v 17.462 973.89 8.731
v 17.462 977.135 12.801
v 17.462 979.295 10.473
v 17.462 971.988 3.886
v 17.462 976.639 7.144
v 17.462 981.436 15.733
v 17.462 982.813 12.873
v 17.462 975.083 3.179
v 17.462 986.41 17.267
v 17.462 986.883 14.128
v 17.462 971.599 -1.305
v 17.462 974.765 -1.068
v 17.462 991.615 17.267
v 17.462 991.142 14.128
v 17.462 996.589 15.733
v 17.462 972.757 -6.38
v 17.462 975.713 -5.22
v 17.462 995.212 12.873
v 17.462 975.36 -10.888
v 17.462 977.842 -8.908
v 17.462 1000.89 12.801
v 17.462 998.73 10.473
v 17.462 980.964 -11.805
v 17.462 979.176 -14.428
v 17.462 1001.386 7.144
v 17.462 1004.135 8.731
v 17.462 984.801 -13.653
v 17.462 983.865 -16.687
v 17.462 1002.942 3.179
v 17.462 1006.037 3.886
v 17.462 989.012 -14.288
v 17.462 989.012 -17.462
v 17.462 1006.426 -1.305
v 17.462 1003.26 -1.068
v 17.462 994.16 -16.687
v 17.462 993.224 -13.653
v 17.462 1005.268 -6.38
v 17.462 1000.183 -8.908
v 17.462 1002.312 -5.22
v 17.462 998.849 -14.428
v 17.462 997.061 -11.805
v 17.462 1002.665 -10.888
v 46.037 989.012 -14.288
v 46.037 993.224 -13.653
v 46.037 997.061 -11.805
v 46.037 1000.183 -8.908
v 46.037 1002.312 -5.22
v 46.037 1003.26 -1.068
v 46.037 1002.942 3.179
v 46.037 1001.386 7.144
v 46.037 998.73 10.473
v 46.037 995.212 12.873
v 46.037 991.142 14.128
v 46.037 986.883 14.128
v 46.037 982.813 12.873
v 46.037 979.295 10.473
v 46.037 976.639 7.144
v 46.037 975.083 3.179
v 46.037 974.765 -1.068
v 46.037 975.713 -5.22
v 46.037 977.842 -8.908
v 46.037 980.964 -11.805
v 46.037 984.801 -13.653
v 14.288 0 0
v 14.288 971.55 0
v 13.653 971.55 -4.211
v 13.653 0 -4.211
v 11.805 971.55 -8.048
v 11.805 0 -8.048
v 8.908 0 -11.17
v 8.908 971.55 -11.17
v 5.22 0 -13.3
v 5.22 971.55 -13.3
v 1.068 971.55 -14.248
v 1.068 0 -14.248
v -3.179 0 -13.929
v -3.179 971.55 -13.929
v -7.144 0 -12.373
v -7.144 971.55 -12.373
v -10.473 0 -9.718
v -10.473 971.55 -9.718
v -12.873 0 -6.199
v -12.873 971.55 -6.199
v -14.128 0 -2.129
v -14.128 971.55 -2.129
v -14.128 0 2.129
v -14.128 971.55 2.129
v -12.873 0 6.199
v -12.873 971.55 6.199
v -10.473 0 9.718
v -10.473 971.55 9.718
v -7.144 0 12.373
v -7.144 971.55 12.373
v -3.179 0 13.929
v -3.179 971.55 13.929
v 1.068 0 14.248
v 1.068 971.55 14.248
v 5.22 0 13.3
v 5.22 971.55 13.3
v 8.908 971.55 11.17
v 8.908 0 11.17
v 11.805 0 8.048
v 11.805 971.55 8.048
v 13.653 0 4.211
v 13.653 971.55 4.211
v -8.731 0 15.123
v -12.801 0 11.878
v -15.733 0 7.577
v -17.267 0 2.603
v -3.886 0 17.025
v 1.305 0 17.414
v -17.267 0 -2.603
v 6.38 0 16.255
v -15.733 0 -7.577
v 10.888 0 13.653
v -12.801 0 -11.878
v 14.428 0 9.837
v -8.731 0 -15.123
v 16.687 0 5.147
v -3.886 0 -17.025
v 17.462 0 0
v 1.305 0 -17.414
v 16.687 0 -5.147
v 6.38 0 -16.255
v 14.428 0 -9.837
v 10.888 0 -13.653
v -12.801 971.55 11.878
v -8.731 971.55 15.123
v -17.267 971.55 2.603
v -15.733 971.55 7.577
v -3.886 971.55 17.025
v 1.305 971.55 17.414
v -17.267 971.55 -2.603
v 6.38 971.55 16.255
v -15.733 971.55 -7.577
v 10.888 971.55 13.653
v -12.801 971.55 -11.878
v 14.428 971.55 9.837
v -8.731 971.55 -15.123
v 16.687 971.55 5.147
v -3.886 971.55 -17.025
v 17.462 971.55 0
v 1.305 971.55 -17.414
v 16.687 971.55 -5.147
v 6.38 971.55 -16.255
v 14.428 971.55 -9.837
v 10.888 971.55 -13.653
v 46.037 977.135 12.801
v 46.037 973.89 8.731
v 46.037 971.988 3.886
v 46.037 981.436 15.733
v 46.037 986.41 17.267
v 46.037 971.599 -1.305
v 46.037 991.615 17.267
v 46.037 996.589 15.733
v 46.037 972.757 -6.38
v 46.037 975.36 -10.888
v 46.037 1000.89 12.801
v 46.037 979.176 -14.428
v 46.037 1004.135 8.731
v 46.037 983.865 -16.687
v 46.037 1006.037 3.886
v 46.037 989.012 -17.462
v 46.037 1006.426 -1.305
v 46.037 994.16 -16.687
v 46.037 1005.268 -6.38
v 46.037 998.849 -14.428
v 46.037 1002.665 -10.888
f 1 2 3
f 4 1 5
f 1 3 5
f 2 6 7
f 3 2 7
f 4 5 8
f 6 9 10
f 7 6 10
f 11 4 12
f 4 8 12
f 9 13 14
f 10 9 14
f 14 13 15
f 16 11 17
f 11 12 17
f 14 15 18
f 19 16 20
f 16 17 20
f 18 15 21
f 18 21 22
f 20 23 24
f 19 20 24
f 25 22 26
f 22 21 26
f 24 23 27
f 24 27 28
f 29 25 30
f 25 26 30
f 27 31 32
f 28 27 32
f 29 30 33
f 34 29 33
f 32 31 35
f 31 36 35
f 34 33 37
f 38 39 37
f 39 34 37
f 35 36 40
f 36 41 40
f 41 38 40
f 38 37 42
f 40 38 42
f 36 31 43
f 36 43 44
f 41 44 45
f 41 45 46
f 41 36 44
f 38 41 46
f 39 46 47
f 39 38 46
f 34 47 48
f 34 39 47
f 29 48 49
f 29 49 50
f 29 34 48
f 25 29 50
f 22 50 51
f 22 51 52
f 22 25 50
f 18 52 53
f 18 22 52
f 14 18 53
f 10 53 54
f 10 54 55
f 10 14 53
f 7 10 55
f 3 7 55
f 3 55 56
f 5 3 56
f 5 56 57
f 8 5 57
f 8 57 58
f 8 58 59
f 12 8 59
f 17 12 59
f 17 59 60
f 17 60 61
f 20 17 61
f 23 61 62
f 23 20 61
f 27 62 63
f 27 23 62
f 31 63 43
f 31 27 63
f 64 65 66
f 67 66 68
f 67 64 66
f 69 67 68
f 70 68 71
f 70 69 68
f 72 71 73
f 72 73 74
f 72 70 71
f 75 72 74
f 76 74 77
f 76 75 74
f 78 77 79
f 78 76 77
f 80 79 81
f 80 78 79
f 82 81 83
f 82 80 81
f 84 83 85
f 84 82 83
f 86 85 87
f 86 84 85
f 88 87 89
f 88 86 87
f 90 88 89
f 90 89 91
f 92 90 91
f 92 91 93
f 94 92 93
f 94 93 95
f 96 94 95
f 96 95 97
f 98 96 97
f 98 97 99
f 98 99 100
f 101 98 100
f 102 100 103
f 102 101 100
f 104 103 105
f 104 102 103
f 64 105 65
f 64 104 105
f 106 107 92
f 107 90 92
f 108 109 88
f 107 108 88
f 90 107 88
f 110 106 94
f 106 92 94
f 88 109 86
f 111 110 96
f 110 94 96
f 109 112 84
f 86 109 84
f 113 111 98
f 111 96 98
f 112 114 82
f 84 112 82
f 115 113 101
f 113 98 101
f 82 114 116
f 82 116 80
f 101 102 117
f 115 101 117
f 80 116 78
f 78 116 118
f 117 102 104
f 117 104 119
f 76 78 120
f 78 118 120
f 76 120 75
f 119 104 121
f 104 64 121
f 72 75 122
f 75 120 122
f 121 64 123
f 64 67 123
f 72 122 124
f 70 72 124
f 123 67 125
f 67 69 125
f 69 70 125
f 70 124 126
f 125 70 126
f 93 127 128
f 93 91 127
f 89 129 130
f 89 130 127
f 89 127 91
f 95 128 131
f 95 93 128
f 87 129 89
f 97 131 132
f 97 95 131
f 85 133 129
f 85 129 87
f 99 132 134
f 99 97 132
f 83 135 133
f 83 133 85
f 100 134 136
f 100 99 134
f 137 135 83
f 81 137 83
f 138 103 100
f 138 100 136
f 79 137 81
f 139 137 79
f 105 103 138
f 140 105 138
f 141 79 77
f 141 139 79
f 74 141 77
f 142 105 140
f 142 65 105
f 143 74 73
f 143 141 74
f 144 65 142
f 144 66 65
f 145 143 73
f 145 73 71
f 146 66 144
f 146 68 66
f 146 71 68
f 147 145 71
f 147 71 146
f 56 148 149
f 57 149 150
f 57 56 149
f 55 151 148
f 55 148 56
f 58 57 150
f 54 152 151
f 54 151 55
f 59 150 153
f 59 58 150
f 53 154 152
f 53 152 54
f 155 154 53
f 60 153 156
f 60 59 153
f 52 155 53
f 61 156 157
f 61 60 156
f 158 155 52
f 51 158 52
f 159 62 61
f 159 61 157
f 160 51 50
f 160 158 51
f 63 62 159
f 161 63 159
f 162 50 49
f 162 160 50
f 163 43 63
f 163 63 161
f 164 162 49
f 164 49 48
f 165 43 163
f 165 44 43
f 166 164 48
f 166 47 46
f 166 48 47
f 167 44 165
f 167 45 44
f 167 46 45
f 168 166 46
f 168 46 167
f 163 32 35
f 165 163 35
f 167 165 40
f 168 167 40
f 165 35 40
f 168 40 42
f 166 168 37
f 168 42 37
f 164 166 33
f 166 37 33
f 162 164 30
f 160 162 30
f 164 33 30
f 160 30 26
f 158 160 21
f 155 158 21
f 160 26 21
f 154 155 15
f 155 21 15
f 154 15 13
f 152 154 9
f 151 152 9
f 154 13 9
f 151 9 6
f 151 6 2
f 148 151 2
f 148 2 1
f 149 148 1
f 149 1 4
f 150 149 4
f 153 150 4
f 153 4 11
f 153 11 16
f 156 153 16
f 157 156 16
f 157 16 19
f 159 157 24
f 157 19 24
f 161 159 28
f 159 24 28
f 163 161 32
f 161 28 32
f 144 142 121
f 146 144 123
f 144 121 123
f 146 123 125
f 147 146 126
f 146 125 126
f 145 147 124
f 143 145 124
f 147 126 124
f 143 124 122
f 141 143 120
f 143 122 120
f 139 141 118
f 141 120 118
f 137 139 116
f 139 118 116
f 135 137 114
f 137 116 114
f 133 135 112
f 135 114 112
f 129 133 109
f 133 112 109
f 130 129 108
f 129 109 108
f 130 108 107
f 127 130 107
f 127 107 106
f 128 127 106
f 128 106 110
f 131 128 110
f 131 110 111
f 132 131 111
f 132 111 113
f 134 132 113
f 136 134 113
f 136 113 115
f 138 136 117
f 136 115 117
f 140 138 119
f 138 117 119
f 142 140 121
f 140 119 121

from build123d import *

# Parameters (mm, degrees)
SKETCH1_R           = 17.4625
SKETCH1_R_2         = 14.2875
BOSS_EXTRUDE1_DEPTH = 971.55
BOSS_EXTRUDE2_START = 17.4625
SKETCH2_R           = 17.4625
SKETCH2_R_2         = 14.2875
BOSS_EXTRUDE2_DEPTH = 28.575


with BuildPart() as part:
    # Sketch1 → Boss-Extrude1 (new body)
    with BuildSketch(Plane(origin=(0, 0, 0), x_dir=(1, 0, 0), z_dir=(0, 1, 0))):
        Circle(SKETCH1_R)
        Circle(SKETCH1_R_2, mode=Mode.SUBTRACT)
    extrude(amount=BOSS_EXTRUDE1_DEPTH)


with BuildPart() as body_2:
    # Sketch2 → Boss-Extrude2 (new body)
    with BuildSketch(Plane(origin=(0, 0, 0), x_dir=(0, 0, -1), z_dir=(1, 0, 0)).offset(BOSS_EXTRUDE2_START)):
        with Locations((0, 989.0125)):
            Circle(SKETCH2_R)
        with Locations((0, 989.0125)):
            Circle(SKETCH2_R_2, mode=Mode.SUBTRACT)
    extrude(amount=BOSS_EXTRUDE2_DEPTH)


solid = Compound([part.part, body_2.part])
